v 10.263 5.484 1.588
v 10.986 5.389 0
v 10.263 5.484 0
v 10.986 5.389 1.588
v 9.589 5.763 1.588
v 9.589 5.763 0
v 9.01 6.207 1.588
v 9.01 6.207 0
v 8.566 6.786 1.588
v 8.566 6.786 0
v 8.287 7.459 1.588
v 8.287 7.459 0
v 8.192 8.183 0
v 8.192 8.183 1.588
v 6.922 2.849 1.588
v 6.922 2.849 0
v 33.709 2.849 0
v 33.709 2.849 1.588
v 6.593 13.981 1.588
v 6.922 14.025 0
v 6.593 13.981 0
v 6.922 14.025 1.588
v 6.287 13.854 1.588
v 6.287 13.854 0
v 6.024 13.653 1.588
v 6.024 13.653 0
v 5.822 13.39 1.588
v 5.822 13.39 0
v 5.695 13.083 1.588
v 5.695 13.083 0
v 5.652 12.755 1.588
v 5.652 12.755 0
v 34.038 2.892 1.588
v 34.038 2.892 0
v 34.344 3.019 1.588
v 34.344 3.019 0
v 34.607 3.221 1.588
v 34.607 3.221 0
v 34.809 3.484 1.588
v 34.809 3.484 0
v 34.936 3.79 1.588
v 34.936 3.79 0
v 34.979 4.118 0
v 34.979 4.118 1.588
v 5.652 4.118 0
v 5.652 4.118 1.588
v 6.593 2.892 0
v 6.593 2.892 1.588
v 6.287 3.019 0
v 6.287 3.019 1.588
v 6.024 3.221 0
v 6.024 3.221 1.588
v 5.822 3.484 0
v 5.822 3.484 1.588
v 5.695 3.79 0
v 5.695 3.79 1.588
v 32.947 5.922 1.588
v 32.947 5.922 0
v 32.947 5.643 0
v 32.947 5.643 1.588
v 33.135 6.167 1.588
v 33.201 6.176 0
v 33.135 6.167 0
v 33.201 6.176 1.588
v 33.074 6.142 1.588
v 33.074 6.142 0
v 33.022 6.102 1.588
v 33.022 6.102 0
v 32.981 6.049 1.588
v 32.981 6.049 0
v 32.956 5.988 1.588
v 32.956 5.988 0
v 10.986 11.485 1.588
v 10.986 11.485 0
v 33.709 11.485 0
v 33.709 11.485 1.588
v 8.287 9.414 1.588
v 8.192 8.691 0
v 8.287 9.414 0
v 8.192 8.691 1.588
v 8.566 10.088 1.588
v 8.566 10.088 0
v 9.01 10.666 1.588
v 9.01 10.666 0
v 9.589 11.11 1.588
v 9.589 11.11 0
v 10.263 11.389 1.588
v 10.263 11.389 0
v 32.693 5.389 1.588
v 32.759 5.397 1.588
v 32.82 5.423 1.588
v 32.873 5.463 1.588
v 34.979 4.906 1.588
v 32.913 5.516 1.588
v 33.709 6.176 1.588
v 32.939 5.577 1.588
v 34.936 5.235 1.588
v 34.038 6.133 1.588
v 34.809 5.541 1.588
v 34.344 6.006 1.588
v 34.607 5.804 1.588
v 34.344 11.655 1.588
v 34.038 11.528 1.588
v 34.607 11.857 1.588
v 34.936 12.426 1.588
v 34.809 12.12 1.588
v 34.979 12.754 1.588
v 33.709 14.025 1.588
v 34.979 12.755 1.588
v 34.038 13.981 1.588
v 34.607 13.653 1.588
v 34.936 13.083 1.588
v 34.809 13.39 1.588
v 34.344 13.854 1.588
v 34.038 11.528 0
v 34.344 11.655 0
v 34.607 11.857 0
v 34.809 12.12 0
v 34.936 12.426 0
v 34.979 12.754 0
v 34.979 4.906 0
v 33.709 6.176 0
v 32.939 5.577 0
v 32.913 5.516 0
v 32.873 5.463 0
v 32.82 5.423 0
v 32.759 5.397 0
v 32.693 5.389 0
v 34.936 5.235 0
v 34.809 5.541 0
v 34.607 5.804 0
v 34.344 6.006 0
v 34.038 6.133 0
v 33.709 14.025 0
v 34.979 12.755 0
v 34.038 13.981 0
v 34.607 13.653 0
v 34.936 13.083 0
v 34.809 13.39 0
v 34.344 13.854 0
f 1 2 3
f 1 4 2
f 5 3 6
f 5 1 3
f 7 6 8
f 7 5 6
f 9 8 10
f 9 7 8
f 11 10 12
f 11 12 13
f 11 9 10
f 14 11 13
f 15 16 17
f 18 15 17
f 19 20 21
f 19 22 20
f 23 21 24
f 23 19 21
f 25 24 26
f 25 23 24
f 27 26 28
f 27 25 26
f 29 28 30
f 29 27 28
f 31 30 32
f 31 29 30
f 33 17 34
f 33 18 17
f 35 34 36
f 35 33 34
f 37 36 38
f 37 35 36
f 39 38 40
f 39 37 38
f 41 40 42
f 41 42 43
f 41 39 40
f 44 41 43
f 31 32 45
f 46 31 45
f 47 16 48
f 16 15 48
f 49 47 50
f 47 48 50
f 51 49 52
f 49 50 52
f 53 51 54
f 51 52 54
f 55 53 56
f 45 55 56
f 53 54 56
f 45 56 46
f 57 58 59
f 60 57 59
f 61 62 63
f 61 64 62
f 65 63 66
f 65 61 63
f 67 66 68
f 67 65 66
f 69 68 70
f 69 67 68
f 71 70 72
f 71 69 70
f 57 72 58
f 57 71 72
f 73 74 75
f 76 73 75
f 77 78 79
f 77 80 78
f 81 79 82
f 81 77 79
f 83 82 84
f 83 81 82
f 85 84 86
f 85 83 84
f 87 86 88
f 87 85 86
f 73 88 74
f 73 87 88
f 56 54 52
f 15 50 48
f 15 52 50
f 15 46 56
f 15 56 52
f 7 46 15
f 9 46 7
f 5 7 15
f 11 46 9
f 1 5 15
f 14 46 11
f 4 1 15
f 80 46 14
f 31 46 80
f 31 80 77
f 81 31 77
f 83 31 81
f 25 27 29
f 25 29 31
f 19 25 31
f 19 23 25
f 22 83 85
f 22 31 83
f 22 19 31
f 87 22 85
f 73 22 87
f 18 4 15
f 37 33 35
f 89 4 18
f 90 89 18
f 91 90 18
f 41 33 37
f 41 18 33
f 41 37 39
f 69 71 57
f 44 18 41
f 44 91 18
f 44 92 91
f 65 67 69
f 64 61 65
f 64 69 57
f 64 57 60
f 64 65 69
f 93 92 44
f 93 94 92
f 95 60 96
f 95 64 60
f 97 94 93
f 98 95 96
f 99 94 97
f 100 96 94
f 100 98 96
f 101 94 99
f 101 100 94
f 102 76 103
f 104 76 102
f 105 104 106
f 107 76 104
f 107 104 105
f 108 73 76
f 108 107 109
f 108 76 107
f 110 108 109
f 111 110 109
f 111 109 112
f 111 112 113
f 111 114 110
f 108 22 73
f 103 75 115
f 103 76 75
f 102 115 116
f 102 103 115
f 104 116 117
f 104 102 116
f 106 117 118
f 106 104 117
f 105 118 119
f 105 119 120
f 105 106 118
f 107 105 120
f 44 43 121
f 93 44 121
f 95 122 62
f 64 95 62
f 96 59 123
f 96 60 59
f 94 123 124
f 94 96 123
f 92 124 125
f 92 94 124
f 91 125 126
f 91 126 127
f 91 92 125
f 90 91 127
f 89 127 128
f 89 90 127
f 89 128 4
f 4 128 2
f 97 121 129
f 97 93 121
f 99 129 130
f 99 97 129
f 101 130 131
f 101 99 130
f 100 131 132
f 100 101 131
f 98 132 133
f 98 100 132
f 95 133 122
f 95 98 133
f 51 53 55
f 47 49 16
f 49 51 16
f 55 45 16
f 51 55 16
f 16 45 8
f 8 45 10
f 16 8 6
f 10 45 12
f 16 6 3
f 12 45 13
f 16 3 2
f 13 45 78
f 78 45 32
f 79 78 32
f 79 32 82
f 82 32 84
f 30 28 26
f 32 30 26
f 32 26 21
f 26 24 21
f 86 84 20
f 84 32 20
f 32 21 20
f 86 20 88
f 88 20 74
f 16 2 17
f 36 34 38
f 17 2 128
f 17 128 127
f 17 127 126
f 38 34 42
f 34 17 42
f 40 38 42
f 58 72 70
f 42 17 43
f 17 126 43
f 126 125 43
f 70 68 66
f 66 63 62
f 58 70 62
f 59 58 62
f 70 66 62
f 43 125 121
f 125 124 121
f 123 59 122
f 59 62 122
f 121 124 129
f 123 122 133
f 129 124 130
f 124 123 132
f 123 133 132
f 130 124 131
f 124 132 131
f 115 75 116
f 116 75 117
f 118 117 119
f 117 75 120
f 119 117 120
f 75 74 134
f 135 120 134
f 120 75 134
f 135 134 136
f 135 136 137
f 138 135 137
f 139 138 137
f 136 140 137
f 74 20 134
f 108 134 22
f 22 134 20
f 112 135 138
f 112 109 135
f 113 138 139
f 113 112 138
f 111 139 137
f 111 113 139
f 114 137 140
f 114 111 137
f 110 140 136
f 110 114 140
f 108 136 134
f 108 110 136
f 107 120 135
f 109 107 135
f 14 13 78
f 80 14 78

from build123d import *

# Parameters (mm, degrees)
BOSS_EXTRUDE1_DEPTH = 1.5875
FILLET1_R           = 1.27
FILLET2_R           = 0.254
FILLET3_R           = 2.794


with BuildPart() as part:
    # Sketch1 → Boss-Extrude1 (new body)
    with BuildSketch(Plane.XY):
        Polygon((5.651886258, 2.848562209), (34.979186258, 2.848562209), (34.979186258, 6.175962209), (32.947186258, 6.175962209), (32.947186258, 5.388562209), (8.191886258, 5.388562209), (8.191886258, 11.484562209), (34.979186258, 11.484562209), (34.979186258, 14.024562209), (5.651886258, 14.024562209), align=None)
    extrude(amount=BOSS_EXTRUDE1_DEPTH)

    # Fillet1
    fillet1_edges = [part.edges().sort_by_distance(p)[0] for p in [
        (5.651886258, 14.024562209, 0.79375),
        (34.979186258, 14.024562209, 0.79375),
        (34.979186258, 11.484562209, 0.79375),
        (34.979186258, 6.175962209, 0.79375),
        (34.979186258, 2.848562209, 0.79375),
        (5.651886258, 2.848562209, 0.79375),
    ]]
    fillet(fillet1_edges, radius=FILLET1_R - 0.0001)  # a hair under: the kernel refuses the full size

    # Fillet2
    fillet2_edges = [part.edges().sort_by_distance(p)[0] for p in [
        (32.947186258, 5.388562209, 0.79375),
        (32.947186258, 6.175962209, 0.79375),
    ]]
    fillet(fillet2_edges, radius=FILLET2_R)

    # Fillet3
    fillet3_edges = [part.edges().sort_by_distance(p)[0] for p in [
        (8.191886258, 11.484562209, 0.79375),
        (8.191886258, 5.388562209, 0.79375),
    ]]
    fillet(fillet3_edges, radius=FILLET3_R)


solid = part.part
